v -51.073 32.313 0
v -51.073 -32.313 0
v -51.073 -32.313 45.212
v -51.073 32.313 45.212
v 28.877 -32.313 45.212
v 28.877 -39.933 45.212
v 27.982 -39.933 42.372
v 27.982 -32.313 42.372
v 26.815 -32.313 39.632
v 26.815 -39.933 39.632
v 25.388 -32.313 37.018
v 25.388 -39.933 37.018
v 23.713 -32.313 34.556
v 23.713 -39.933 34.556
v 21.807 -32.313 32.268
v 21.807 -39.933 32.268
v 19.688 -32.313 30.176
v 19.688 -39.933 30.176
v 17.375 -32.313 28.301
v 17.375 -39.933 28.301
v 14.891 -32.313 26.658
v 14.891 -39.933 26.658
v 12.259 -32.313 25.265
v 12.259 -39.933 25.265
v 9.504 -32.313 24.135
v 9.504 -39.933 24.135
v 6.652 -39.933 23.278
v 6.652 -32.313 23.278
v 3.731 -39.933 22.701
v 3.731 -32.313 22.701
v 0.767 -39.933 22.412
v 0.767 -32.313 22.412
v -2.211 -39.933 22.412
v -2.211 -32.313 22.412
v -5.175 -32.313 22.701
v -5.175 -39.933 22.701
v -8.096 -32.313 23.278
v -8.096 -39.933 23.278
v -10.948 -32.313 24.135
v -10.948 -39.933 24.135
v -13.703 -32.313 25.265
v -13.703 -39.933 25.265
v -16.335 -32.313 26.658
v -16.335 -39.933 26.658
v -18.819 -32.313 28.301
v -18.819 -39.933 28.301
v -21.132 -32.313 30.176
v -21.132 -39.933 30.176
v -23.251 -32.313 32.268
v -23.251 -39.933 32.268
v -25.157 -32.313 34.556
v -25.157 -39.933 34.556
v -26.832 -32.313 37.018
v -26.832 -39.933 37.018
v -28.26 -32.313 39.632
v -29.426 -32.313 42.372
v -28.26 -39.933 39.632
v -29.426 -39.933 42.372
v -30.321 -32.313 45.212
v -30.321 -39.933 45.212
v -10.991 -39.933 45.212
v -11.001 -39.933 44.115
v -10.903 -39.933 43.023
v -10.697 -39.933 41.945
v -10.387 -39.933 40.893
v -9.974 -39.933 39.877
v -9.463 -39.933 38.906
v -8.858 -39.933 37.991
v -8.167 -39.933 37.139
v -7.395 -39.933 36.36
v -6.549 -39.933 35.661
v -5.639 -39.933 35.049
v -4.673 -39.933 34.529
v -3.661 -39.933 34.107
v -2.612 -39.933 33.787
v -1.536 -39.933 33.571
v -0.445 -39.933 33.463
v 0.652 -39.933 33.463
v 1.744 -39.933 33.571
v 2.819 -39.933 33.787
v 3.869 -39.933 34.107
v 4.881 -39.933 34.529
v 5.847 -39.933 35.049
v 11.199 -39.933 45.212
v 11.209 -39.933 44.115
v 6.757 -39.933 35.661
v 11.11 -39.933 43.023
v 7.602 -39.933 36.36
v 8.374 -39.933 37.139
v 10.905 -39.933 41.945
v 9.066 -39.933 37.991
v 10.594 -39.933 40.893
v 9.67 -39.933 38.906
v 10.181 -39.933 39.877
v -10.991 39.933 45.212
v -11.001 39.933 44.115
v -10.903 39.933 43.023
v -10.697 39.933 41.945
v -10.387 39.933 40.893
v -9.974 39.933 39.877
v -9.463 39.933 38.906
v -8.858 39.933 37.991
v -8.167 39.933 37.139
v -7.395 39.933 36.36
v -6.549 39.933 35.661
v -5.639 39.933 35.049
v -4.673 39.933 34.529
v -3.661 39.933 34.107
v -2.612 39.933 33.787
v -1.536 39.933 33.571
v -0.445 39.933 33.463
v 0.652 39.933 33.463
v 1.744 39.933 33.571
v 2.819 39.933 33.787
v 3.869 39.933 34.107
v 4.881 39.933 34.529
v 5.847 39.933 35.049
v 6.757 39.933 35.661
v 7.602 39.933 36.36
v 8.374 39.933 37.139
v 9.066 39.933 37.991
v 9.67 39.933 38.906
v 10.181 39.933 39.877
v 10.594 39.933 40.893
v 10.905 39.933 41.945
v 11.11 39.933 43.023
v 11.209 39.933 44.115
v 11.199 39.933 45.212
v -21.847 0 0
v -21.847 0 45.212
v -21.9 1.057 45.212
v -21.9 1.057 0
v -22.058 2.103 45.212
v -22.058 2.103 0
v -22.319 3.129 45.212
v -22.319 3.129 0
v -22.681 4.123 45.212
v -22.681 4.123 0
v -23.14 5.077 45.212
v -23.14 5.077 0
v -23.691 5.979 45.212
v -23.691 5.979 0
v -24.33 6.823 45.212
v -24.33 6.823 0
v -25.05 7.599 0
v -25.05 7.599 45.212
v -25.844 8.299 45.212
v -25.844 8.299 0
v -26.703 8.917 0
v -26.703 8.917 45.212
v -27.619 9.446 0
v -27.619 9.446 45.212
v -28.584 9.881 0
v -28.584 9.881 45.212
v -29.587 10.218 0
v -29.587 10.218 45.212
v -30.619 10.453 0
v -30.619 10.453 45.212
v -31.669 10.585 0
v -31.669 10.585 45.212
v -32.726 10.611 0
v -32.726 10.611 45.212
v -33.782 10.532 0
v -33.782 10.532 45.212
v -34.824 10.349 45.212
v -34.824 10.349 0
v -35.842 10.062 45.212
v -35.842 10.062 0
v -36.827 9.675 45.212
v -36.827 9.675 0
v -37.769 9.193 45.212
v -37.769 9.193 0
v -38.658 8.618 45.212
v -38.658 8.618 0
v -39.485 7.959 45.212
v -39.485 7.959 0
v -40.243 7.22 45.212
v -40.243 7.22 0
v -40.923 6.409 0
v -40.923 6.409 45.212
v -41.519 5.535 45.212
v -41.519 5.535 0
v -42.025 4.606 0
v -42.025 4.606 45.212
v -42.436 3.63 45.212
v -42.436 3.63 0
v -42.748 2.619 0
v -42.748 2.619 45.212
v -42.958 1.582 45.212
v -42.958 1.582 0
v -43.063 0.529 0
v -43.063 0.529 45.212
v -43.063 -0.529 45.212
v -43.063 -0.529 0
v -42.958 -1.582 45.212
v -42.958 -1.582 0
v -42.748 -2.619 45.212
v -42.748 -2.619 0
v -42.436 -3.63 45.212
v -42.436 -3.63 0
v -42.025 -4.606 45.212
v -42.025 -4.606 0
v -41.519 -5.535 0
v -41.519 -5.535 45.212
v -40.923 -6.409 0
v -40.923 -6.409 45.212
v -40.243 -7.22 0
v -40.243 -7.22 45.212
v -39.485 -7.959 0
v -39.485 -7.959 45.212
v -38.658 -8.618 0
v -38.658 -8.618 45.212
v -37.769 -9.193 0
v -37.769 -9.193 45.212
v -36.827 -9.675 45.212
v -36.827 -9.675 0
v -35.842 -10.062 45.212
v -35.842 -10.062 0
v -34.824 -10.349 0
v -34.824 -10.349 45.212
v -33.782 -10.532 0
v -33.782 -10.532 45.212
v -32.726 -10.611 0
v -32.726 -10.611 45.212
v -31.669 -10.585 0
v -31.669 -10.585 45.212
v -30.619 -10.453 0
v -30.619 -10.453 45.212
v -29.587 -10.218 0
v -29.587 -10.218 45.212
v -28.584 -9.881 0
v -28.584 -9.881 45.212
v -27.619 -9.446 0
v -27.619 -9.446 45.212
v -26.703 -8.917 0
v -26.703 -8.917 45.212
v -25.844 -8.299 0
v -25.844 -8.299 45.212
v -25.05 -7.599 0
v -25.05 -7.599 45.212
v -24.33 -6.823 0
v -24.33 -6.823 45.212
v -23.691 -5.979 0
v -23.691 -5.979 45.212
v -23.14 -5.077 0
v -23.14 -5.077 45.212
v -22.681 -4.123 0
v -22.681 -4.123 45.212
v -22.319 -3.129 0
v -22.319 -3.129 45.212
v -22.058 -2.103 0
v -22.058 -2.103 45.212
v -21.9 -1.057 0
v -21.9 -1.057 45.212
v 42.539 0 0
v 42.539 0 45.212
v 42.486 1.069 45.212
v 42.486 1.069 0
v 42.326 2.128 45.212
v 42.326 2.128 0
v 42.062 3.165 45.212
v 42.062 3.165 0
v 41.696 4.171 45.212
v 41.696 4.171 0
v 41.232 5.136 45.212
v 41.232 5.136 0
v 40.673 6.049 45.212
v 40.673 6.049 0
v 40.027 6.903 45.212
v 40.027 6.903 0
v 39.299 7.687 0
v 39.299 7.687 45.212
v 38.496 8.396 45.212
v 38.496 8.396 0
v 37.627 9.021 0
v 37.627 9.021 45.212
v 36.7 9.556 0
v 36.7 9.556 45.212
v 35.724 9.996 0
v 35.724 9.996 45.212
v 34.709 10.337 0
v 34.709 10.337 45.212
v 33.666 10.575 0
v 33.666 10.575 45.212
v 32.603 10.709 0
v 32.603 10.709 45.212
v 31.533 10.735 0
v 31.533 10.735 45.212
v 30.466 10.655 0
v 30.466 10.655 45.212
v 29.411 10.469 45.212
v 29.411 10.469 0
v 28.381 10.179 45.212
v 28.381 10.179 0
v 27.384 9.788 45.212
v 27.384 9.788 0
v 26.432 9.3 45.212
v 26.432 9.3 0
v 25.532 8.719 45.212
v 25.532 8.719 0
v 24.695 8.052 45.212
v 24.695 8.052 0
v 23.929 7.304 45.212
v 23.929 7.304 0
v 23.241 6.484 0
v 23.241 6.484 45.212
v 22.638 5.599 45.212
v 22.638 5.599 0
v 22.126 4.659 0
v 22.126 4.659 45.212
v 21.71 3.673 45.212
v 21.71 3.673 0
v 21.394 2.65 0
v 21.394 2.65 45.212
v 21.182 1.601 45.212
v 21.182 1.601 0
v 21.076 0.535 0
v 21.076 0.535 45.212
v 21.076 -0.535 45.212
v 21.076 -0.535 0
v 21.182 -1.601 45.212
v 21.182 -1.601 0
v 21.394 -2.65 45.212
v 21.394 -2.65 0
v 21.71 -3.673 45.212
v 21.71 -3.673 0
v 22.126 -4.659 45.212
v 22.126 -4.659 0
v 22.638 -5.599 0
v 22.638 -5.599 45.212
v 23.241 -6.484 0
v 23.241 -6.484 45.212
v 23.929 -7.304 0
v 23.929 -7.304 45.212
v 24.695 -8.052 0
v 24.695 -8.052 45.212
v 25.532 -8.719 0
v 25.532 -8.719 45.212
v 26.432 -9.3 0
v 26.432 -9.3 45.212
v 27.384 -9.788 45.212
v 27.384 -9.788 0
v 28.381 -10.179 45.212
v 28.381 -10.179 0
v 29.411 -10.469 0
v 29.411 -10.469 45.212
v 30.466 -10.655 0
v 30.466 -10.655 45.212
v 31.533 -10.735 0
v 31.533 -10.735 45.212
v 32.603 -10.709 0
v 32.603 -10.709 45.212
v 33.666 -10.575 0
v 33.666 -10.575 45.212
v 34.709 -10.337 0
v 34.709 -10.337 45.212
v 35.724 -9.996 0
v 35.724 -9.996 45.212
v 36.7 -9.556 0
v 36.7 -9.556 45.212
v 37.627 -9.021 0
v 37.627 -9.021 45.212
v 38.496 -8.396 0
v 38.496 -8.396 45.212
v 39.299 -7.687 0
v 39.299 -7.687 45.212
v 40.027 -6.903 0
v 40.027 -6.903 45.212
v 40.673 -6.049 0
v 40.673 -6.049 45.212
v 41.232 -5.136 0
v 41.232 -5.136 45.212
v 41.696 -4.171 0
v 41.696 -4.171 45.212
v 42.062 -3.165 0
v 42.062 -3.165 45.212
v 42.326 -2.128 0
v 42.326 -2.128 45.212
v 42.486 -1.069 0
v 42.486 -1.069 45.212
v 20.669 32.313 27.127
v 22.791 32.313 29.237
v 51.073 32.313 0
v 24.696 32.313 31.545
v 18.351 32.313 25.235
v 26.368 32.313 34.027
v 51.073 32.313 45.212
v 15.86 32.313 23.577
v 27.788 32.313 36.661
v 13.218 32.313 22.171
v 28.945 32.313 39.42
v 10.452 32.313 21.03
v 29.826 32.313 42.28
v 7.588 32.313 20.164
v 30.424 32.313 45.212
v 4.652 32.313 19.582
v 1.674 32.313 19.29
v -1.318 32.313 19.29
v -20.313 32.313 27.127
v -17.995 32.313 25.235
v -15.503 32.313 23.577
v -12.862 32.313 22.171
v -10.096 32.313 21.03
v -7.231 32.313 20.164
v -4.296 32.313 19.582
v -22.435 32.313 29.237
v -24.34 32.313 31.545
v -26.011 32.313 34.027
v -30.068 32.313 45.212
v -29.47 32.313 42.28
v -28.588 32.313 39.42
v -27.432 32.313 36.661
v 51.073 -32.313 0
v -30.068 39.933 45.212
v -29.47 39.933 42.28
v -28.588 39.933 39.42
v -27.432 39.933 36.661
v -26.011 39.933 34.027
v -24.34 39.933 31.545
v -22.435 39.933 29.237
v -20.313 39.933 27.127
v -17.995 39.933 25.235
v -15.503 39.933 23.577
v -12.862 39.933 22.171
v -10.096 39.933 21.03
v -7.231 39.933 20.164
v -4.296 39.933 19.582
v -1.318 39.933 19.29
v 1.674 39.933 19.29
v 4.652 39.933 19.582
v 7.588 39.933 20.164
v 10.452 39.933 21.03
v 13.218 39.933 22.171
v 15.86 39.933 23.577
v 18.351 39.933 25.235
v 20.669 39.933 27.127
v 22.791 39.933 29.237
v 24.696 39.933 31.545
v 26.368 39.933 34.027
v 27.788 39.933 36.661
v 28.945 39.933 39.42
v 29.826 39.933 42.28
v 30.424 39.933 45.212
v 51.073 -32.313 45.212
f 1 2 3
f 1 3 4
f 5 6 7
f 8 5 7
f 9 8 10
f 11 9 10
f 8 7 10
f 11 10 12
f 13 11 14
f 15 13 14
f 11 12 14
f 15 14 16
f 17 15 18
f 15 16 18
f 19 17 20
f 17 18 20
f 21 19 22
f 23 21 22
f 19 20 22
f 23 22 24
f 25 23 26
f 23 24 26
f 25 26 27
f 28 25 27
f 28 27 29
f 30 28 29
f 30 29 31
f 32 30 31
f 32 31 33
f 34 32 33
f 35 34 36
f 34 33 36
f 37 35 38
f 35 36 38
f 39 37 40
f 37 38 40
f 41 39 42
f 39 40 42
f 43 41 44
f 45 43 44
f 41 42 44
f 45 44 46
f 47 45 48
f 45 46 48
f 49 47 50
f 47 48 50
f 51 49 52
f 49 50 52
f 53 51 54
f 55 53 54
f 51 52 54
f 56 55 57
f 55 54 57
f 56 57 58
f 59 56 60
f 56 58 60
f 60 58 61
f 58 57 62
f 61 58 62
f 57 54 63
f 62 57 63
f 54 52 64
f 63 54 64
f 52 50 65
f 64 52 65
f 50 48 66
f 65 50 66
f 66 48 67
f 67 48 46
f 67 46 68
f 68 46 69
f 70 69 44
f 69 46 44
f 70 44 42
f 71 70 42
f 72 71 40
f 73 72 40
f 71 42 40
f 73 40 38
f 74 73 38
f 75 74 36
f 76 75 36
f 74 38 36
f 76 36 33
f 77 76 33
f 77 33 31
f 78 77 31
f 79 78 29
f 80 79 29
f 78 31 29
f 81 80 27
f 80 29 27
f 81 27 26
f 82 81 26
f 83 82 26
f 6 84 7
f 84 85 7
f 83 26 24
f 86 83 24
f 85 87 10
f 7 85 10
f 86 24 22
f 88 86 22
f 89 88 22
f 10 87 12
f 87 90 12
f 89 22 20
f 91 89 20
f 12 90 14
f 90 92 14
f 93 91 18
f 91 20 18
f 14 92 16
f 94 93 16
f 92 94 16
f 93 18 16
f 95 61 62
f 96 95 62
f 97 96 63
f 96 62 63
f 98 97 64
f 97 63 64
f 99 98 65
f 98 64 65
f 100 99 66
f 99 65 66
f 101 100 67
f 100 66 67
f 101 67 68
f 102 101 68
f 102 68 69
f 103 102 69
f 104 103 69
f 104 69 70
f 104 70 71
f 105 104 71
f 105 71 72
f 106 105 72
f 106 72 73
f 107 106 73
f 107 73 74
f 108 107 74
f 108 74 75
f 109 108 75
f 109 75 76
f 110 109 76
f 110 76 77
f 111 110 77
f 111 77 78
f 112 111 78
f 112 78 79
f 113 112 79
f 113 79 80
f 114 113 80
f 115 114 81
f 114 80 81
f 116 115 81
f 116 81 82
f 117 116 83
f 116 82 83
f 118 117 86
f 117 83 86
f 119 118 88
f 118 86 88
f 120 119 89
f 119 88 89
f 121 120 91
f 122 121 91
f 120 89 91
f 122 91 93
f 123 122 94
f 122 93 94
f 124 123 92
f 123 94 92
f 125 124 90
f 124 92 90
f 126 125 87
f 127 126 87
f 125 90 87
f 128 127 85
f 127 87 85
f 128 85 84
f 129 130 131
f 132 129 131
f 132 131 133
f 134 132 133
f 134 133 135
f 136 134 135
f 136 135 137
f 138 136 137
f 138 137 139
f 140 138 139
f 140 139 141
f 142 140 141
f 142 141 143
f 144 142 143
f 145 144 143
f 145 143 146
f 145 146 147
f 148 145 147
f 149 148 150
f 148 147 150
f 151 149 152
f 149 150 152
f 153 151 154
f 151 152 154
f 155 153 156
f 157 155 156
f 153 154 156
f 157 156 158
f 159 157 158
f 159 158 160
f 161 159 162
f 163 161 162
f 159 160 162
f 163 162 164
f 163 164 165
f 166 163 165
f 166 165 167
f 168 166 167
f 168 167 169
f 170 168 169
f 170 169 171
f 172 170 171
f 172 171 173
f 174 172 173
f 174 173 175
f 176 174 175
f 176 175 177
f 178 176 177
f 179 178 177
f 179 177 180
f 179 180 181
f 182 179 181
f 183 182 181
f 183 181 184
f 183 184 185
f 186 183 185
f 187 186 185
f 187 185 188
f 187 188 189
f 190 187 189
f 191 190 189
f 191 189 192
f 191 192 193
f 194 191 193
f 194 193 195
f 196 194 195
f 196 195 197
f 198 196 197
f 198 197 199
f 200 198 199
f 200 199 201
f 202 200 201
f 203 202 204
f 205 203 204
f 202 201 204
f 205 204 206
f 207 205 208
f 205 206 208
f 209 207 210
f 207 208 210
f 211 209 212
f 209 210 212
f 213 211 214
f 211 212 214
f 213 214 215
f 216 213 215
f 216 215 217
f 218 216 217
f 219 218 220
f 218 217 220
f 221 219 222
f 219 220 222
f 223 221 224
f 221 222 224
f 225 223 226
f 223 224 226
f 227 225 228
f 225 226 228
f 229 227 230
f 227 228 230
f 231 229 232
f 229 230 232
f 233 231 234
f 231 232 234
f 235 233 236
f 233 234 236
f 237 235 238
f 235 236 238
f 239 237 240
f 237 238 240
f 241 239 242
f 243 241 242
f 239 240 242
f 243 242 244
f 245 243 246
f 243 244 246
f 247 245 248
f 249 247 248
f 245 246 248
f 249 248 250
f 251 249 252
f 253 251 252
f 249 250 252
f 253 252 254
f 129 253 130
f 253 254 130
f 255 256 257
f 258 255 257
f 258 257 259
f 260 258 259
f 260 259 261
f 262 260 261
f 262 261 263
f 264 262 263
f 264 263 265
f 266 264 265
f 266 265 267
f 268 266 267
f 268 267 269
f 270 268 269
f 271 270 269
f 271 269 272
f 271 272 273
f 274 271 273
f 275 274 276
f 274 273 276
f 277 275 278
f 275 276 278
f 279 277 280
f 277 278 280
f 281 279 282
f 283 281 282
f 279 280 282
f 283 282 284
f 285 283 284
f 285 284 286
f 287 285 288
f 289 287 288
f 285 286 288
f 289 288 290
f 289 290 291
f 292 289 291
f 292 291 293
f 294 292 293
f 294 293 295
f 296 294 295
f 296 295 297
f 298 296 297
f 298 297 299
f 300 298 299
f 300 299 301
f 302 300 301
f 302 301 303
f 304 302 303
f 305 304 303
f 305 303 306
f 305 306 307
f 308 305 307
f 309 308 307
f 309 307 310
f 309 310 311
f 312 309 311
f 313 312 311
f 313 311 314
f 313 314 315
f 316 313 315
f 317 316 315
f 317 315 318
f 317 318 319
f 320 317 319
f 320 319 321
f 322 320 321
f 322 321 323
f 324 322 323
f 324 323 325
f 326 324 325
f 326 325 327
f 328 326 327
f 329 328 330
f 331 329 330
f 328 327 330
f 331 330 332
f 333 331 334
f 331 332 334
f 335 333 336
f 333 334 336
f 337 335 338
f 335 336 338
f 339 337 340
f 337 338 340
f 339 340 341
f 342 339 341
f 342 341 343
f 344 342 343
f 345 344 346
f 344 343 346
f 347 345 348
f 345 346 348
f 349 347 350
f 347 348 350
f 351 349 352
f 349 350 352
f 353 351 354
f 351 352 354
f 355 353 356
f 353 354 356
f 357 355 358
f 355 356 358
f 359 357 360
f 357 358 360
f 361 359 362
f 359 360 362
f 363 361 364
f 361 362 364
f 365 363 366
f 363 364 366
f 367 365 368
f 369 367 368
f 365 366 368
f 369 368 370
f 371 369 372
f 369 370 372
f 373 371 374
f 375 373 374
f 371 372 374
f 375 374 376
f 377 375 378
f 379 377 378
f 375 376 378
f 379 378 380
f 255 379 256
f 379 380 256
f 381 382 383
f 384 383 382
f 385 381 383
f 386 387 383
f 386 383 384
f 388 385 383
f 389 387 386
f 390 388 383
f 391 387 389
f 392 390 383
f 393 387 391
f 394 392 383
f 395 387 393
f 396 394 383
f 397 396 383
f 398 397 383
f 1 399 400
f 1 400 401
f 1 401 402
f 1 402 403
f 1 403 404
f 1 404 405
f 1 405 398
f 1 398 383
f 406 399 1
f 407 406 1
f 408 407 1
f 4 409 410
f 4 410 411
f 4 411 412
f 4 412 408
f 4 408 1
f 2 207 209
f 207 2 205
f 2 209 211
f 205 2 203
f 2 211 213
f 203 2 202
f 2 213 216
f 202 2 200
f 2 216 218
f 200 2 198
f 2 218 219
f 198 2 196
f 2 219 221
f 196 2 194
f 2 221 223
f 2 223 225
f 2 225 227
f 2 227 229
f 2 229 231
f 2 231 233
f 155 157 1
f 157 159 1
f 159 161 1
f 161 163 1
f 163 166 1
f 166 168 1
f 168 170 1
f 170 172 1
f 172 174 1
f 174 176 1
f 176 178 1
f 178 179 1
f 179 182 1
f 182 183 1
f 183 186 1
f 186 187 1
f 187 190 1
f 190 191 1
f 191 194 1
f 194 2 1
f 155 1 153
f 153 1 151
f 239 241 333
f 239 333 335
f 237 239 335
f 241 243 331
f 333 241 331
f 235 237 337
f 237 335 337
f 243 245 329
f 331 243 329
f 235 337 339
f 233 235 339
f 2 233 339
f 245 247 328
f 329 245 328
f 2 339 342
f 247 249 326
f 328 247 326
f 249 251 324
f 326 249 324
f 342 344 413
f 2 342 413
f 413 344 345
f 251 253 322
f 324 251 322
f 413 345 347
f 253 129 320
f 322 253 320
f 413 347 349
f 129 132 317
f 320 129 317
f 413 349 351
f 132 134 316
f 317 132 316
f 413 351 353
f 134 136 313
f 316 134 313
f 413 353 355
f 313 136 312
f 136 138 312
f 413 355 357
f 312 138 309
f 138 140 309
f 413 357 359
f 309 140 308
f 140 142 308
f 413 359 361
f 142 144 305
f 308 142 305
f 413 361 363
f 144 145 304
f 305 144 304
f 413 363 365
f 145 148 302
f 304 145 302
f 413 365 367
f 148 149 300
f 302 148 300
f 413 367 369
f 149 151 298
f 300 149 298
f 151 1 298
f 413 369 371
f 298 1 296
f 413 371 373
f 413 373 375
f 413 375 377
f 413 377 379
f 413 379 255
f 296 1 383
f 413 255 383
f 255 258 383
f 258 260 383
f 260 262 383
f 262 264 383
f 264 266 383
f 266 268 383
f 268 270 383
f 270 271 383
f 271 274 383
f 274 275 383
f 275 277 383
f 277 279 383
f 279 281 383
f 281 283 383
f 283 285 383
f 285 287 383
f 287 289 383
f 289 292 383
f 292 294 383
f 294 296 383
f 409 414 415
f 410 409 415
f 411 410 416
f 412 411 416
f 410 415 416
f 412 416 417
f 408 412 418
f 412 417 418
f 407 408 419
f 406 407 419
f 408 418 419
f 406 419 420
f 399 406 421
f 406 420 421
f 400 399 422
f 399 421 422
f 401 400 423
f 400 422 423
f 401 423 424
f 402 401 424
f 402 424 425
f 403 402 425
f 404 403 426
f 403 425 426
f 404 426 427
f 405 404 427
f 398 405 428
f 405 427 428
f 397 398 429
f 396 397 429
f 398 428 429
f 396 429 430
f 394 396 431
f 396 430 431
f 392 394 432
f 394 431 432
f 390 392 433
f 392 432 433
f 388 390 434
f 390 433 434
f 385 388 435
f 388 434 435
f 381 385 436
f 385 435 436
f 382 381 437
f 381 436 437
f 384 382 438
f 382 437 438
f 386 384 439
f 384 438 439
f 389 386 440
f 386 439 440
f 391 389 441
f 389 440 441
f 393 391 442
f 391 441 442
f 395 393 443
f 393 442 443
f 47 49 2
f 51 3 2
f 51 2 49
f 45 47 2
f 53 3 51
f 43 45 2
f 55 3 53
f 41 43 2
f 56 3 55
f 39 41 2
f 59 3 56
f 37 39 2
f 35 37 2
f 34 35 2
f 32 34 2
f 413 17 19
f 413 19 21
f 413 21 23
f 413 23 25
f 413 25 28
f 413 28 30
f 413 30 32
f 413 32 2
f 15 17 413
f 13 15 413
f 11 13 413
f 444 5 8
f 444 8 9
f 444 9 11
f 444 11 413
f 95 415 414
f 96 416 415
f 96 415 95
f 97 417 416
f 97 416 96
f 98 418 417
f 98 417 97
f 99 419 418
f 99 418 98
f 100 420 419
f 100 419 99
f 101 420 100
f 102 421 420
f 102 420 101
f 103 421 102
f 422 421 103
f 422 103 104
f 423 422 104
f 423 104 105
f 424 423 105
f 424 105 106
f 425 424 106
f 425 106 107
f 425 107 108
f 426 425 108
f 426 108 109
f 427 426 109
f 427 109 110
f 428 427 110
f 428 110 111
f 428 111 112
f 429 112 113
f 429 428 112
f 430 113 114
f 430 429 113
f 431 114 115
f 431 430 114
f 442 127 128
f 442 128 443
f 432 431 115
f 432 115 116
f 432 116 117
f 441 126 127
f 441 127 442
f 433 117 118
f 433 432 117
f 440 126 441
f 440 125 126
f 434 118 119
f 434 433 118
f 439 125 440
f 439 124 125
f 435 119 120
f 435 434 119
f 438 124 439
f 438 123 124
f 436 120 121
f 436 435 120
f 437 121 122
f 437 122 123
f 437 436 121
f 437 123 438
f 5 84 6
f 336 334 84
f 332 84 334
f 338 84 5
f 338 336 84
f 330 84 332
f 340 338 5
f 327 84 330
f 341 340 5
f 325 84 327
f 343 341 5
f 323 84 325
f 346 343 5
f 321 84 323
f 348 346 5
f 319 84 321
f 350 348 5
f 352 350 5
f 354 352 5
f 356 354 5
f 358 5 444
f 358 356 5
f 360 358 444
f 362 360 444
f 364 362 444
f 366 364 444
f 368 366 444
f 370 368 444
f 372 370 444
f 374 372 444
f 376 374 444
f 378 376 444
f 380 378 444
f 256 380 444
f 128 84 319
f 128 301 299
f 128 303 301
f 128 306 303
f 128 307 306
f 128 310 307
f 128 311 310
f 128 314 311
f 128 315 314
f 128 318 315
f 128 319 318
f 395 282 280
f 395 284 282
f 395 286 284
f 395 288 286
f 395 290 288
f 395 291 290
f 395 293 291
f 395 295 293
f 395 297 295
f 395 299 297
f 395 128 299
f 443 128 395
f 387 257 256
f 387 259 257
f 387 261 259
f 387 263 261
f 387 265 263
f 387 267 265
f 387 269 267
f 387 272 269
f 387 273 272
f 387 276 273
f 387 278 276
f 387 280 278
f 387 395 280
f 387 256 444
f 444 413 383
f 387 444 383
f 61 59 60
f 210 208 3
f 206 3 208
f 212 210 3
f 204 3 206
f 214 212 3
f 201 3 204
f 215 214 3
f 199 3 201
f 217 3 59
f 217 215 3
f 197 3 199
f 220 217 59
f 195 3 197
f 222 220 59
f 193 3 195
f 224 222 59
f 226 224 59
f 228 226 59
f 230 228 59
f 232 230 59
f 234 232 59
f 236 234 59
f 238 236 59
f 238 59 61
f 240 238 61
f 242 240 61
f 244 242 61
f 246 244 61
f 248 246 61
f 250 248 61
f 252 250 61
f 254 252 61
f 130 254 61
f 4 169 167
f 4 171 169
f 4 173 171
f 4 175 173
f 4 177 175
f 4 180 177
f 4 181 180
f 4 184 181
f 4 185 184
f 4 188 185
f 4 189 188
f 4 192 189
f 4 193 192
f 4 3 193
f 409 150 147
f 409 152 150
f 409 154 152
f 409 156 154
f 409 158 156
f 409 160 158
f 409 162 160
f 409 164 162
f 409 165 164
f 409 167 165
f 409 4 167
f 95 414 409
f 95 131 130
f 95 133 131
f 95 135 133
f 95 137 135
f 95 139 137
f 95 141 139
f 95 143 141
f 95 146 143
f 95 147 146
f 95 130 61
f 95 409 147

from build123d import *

# Parameters (mm, degrees)
F0_W      = 102.14658
F0_H      = 79.865314
F1_DEPTH  = 45.212
F3_DEPTH  = 7.62
F5_DEPTH  = 7.62
F8_DEPTH  = 240.792
F9_R      = 10.614666
F9_R_2    = 10.738577
F10_DEPTH = 83.566


with BuildPart() as f1:
    # F0 (on Top) → F1 (new body)
    with BuildSketch(Plane.XY):
        Rectangle(F0_W, F0_H)
    extrude(amount=F1_DEPTH)

    # F2 (on face) → F3 (cut)
    with BuildSketch(Plane(origin=(0, 39.932657, 0), x_dir=(-1, 0, 0), z_dir=(0, 1, 0))):
        with BuildLine():
            ThreePointArc((30.067937, 45.212), (-0.178194, 19.253555), (-30.424325, 45.212))
            Line((-30.424325, 45.212), (-51.07329, 45.212))
            Line((-51.07329, 45.212), (-51.07329, 0))
            Line((-51.07329, 0), (51.07329, 0))
            Line((51.07329, 0), (51.07329, 45.212))
            Line((51.07329, 45.212), (30.067937, 45.212))
        make_face()
    extrude(amount=-F3_DEPTH, mode=Mode.SUBTRACT)

    # F4 (on face) → F5 (cut)
    with BuildSketch(Plane.XZ.offset(39.932657)):
        with BuildLine():
            ThreePointArc((28.876837, 45.212), (-0.72209, 22.375665), (-30.321017, 45.212))
            Line((-30.321017, 45.212), (-51.07329, 45.212))
            Line((-51.07329, 45.212), (-51.07329, 0))
            Line((-51.07329, 0), (51.07329, 0))
            Line((51.07329, 0), (51.07329, 45.212))
            Line((51.07329, 45.212), (28.876837, 45.212))
        make_face()
    extrude(amount=-F5_DEPTH, mode=Mode.SUBTRACT)

    # F7 (on face) → F8 (cut)
    with BuildSketch(Plane.XZ.offset(39.932657)):
        with BuildLine():
            Line((11.198889, 45.212), (-10.991339, 45.212))
            ThreePointArc((-10.991339, 45.212), (0.103775, 33.44965), (11.198889, 45.212))
        make_face()
    extrude(amount=-F8_DEPTH, mode=Mode.SUBTRACT)

    # F9 (on face) → F10 (cut)
    with BuildSketch(Plane.XY.offset(45.212)):
        with Locations((-32.461744, 0)):
            Circle(F9_R)
        with Locations((31.800803, 0)):
            Circle(F9_R_2)
    extrude(amount=-F10_DEPTH, mode=Mode.SUBTRACT)


solid = f1.part
